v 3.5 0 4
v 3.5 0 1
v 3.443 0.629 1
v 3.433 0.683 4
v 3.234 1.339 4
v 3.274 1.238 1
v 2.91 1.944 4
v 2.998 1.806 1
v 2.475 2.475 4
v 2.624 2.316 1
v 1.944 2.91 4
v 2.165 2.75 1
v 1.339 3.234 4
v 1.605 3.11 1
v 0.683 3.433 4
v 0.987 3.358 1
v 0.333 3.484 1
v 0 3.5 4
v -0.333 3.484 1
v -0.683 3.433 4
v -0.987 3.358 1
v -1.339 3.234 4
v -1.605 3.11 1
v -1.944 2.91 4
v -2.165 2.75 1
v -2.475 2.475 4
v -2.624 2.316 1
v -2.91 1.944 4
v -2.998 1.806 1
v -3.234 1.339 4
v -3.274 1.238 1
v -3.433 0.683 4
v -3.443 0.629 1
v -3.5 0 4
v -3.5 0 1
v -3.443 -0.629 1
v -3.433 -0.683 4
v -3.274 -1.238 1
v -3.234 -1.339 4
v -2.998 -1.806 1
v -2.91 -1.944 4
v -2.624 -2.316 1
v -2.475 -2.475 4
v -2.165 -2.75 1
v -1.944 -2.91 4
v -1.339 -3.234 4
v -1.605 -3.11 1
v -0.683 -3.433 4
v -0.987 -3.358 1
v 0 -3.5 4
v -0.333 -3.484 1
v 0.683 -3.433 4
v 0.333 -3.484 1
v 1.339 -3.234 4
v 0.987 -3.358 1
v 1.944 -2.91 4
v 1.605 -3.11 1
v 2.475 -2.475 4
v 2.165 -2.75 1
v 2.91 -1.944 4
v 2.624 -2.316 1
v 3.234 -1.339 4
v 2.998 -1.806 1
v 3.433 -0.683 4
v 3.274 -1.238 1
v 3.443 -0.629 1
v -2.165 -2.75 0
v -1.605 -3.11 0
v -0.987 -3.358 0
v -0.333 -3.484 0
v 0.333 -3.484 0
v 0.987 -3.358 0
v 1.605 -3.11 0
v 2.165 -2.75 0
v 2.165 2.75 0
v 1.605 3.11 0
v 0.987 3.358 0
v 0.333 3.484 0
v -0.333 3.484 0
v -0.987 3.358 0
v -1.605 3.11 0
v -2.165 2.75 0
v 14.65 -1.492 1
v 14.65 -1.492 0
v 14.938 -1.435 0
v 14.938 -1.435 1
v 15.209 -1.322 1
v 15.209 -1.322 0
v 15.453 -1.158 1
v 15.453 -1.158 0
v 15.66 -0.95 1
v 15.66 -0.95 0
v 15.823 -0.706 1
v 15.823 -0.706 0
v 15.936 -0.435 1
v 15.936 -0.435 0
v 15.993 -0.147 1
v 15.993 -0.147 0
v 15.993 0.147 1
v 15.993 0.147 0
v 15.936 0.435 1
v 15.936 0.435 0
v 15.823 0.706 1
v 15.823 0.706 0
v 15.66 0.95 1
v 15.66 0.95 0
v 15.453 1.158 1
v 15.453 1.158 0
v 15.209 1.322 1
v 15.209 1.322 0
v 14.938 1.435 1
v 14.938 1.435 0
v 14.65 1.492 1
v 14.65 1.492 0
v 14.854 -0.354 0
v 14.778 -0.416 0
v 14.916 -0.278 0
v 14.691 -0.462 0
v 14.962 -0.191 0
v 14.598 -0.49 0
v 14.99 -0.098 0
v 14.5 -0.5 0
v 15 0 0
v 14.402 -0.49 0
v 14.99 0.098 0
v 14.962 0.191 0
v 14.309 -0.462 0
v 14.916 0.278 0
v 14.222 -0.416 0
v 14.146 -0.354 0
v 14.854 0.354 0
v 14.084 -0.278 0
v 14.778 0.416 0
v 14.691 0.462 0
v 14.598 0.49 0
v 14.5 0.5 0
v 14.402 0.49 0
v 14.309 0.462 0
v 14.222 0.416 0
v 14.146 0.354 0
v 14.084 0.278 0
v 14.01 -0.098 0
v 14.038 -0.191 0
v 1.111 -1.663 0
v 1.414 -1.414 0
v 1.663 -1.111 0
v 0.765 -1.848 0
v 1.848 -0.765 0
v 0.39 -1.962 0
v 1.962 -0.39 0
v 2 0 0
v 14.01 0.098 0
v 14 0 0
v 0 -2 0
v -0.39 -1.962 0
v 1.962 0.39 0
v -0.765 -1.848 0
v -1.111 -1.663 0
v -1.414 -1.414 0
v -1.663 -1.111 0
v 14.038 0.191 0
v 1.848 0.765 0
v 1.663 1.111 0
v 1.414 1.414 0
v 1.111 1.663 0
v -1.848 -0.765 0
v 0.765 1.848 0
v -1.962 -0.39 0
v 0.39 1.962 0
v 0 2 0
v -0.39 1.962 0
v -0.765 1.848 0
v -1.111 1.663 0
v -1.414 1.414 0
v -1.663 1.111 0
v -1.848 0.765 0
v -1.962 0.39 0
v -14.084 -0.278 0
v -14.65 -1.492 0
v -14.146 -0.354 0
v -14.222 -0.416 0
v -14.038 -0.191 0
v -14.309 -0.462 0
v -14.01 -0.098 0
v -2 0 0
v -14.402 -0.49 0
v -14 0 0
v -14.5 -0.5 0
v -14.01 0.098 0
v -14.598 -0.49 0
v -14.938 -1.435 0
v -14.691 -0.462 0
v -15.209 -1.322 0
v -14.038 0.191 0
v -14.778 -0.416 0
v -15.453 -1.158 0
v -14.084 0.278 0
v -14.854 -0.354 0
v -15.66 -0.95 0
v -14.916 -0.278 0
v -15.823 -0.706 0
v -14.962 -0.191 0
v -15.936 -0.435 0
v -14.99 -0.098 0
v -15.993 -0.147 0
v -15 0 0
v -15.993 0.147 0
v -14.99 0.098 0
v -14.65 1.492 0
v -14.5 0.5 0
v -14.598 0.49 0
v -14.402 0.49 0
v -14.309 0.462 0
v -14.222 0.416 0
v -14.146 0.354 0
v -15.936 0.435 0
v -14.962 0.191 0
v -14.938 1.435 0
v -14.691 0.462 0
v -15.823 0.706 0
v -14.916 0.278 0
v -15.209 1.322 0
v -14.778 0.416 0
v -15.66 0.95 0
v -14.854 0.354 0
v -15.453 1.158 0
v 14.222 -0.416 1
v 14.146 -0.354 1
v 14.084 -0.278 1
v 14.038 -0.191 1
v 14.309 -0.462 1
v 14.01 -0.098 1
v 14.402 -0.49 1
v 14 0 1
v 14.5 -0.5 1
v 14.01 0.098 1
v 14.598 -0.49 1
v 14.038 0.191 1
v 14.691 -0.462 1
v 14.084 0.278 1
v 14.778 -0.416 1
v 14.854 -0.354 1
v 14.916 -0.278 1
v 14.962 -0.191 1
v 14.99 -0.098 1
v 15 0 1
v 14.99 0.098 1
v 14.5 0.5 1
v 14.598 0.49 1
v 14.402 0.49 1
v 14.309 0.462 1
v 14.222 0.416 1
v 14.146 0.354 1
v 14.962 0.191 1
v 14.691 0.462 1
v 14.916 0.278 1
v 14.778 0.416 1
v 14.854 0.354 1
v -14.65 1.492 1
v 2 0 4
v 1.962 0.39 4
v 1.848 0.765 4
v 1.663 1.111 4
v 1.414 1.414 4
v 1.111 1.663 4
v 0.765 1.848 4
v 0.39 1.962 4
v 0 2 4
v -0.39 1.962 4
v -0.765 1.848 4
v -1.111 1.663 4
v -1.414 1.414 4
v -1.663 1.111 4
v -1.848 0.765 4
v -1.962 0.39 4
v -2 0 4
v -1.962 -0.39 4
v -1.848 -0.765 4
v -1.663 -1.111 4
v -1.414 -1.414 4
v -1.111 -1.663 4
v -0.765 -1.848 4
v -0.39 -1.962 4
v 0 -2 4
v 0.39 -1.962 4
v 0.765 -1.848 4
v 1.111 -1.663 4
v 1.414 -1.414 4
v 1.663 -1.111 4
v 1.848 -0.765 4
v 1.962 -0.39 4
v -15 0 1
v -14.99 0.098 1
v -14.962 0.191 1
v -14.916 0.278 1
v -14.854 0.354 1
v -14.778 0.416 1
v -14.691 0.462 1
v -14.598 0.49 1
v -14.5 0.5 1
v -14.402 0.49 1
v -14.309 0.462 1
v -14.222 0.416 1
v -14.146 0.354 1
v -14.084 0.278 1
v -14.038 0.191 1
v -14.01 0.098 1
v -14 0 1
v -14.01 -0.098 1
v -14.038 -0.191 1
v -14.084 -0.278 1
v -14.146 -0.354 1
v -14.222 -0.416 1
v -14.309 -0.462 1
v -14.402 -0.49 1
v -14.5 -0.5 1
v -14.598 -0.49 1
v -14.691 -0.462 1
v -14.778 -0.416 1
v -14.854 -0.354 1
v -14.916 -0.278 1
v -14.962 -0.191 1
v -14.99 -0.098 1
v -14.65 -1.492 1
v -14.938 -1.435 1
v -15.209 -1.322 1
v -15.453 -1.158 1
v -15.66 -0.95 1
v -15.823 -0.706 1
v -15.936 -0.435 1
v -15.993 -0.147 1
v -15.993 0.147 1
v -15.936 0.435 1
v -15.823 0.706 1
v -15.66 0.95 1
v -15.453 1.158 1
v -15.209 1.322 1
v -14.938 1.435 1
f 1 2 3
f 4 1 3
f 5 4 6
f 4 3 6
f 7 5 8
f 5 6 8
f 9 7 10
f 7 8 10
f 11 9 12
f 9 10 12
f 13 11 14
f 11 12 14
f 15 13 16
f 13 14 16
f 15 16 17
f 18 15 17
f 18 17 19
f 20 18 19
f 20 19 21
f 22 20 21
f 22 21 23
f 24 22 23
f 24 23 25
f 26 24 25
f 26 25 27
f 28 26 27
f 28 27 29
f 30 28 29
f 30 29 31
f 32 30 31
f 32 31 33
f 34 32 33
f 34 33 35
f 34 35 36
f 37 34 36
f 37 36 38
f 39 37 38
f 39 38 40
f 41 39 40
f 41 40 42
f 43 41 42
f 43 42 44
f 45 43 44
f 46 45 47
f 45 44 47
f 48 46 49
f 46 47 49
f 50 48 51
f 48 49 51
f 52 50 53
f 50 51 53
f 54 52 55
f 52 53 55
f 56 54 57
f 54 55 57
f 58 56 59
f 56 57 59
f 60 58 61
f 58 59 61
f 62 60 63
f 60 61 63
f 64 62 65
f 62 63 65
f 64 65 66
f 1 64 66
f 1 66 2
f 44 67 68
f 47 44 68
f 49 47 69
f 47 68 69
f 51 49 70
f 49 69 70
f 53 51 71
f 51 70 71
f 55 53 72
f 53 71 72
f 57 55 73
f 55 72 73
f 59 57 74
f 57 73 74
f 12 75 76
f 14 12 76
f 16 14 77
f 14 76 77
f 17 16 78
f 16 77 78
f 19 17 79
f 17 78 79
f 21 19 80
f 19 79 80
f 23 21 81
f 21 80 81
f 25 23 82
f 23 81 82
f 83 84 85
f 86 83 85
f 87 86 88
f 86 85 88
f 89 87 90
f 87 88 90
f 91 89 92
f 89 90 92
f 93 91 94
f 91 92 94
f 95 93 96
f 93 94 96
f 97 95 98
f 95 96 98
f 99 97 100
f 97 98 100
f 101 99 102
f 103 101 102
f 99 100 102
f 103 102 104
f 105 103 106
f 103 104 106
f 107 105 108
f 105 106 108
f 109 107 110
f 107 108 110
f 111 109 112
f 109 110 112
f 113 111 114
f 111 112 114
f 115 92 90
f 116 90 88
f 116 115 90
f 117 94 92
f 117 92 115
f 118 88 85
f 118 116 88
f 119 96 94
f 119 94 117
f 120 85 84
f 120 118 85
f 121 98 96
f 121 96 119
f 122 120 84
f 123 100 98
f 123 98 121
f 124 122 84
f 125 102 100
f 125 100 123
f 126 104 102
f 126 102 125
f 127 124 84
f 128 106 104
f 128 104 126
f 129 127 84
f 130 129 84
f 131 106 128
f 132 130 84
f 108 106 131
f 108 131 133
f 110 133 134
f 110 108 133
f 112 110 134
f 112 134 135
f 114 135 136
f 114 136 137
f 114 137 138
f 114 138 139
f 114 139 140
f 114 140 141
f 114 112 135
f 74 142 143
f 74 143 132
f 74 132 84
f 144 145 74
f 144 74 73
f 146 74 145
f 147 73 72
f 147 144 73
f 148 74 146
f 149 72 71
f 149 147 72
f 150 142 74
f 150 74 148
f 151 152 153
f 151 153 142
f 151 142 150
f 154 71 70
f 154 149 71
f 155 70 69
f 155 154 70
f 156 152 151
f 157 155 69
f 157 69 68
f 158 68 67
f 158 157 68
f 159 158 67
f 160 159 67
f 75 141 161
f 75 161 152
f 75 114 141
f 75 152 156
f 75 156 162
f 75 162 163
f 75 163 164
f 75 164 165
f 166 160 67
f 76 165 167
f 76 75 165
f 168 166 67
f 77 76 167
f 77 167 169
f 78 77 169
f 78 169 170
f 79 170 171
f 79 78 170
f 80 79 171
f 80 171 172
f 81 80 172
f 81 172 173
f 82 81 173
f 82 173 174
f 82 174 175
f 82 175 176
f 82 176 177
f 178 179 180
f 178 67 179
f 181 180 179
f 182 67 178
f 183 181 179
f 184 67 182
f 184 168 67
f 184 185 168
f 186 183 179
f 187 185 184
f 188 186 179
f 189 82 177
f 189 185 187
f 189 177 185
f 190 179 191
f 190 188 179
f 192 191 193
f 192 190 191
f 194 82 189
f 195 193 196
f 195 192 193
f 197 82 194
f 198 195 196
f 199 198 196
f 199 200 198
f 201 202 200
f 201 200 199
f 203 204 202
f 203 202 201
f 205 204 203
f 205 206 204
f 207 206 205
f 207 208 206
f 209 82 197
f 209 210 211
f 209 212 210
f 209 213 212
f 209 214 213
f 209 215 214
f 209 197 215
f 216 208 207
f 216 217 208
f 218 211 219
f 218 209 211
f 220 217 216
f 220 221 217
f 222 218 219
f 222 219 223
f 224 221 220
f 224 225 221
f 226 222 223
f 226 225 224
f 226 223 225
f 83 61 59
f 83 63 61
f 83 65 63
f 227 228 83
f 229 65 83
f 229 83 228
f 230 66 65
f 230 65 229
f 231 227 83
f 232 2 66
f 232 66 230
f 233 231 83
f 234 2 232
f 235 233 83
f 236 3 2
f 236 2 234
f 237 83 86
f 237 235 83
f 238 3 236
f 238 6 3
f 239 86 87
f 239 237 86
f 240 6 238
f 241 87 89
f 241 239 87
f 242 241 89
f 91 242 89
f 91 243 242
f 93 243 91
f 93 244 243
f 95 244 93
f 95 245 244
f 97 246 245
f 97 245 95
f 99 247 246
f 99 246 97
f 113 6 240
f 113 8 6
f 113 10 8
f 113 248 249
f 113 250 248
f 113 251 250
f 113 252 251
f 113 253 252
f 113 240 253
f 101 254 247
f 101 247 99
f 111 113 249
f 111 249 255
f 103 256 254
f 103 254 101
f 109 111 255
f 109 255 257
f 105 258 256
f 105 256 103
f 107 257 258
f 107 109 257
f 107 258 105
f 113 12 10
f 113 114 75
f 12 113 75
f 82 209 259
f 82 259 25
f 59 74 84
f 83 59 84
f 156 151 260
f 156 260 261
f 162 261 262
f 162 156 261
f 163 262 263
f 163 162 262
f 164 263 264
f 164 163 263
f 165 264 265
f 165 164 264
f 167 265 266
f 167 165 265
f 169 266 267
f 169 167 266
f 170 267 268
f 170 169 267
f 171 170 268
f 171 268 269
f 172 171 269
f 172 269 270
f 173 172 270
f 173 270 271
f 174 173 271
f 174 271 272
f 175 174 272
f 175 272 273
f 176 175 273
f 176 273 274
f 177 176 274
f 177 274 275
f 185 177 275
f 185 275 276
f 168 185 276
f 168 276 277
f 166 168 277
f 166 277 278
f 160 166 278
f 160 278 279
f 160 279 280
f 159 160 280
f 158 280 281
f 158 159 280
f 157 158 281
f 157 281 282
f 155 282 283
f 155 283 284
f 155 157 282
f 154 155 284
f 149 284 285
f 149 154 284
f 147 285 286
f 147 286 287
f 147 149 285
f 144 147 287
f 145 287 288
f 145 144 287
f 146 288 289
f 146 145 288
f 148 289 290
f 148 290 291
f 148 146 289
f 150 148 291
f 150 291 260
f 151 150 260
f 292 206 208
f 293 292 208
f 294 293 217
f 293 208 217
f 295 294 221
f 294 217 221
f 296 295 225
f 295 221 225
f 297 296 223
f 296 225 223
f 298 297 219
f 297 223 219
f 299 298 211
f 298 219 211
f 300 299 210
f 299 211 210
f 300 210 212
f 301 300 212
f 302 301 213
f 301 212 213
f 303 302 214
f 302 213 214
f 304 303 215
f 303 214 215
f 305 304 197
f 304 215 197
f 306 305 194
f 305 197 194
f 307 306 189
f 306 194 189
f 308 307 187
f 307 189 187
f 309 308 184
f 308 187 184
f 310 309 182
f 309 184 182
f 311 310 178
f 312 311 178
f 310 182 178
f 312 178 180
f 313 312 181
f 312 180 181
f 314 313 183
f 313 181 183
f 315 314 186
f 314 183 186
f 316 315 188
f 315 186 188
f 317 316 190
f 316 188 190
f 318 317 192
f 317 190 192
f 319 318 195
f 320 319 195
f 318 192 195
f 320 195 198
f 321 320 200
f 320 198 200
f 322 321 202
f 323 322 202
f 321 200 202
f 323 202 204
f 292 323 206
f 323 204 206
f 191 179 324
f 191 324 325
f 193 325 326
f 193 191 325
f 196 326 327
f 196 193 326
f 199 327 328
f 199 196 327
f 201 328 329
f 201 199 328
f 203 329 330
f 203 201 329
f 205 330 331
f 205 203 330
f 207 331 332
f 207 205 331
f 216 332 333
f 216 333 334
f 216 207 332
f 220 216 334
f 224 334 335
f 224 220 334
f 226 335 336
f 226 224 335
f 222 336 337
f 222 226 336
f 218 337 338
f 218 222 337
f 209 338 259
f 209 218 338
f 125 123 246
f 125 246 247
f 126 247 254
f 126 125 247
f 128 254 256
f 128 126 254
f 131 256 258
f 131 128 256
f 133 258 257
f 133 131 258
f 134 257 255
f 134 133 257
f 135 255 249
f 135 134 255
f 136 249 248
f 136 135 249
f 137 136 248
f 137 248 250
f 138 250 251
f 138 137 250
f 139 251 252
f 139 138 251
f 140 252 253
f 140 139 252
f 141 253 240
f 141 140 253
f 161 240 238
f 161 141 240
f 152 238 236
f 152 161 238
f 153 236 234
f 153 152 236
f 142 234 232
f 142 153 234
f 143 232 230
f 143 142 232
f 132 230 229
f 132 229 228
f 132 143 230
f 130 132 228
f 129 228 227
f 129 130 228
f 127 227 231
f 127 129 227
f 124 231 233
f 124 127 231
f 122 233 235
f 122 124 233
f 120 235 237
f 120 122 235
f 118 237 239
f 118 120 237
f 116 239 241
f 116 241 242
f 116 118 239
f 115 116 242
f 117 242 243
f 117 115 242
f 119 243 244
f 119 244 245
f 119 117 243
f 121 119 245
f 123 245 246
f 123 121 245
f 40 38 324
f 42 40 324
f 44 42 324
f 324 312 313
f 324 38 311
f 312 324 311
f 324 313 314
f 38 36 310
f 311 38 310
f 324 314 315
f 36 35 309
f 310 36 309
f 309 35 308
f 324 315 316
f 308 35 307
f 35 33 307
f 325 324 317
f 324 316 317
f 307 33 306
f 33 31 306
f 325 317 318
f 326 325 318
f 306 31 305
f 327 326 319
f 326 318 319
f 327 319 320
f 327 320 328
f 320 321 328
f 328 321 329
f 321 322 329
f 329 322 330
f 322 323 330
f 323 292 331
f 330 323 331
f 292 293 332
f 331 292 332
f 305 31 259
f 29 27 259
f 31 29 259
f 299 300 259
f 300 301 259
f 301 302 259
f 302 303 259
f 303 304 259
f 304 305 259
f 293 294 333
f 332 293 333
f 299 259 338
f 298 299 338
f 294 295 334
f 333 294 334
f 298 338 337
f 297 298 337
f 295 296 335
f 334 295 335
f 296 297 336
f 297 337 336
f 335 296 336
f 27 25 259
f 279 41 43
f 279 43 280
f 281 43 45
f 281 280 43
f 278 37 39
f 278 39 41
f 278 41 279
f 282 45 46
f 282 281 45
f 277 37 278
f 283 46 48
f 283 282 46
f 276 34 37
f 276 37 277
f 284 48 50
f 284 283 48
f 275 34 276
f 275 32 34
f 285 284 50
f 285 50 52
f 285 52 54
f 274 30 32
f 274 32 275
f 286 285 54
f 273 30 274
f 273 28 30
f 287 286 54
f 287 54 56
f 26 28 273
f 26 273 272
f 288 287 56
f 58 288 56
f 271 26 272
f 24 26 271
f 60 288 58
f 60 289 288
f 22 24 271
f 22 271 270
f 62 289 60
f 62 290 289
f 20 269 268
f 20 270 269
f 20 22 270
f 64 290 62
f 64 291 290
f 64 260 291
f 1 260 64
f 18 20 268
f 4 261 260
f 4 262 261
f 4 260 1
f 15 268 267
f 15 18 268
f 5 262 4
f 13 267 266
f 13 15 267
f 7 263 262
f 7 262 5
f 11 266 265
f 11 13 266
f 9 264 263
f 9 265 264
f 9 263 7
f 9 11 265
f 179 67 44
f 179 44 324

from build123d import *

# Parameters (mm, degrees)
SKETCH_1_R      = 2
SKETCH_1_R_2    = 0.5
EXTRUDE_2_DEPTH = 1
SKETCH_2_R      = 3.5
SKETCH_2_R_2    = 2
EXTRUDE_3_DEPTH = 3


with BuildPart() as part:
    # 草图1 → 凸台-拉伸2 (new body)
    with BuildSketch(Plane.XY):
        with BuildLine():
            Line((14.650323726, 1.492448585), (2.165063509, 2.75))
            ThreePointArc((2.165063509, 2.75), (-3.5, 0), (2.165063509, -2.75))
            Line((2.165063509, -2.75), (14.650323726, -1.492448585))
            ThreePointArc((14.650323726, -1.492448585), (16, 0), (14.650323726, 1.492448585))
        make_face()
        Circle(SKETCH_1_R, mode=Mode.SUBTRACT)
        with Locations((14.5, 0)):
            Circle(SKETCH_1_R_2, mode=Mode.SUBTRACT)
    extrude_2 = extrude(amount=EXTRUDE_2_DEPTH)

    # 草图2 → 凸台-拉伸3 (add)
    with BuildSketch(Plane.XY.offset(1)):
        Circle(SKETCH_2_R)
        Circle(SKETCH_2_R_2, mode=Mode.SUBTRACT)
    extrude(amount=EXTRUDE_3_DEPTH)

    # 镜向1: 凸台-拉伸2 across plane
    add(extrude_2.mirror(Plane(origin=(0, 0, 0), x_dir=(0, 0, 1), z_dir=(1, 0, 0))))


solid = part.part
